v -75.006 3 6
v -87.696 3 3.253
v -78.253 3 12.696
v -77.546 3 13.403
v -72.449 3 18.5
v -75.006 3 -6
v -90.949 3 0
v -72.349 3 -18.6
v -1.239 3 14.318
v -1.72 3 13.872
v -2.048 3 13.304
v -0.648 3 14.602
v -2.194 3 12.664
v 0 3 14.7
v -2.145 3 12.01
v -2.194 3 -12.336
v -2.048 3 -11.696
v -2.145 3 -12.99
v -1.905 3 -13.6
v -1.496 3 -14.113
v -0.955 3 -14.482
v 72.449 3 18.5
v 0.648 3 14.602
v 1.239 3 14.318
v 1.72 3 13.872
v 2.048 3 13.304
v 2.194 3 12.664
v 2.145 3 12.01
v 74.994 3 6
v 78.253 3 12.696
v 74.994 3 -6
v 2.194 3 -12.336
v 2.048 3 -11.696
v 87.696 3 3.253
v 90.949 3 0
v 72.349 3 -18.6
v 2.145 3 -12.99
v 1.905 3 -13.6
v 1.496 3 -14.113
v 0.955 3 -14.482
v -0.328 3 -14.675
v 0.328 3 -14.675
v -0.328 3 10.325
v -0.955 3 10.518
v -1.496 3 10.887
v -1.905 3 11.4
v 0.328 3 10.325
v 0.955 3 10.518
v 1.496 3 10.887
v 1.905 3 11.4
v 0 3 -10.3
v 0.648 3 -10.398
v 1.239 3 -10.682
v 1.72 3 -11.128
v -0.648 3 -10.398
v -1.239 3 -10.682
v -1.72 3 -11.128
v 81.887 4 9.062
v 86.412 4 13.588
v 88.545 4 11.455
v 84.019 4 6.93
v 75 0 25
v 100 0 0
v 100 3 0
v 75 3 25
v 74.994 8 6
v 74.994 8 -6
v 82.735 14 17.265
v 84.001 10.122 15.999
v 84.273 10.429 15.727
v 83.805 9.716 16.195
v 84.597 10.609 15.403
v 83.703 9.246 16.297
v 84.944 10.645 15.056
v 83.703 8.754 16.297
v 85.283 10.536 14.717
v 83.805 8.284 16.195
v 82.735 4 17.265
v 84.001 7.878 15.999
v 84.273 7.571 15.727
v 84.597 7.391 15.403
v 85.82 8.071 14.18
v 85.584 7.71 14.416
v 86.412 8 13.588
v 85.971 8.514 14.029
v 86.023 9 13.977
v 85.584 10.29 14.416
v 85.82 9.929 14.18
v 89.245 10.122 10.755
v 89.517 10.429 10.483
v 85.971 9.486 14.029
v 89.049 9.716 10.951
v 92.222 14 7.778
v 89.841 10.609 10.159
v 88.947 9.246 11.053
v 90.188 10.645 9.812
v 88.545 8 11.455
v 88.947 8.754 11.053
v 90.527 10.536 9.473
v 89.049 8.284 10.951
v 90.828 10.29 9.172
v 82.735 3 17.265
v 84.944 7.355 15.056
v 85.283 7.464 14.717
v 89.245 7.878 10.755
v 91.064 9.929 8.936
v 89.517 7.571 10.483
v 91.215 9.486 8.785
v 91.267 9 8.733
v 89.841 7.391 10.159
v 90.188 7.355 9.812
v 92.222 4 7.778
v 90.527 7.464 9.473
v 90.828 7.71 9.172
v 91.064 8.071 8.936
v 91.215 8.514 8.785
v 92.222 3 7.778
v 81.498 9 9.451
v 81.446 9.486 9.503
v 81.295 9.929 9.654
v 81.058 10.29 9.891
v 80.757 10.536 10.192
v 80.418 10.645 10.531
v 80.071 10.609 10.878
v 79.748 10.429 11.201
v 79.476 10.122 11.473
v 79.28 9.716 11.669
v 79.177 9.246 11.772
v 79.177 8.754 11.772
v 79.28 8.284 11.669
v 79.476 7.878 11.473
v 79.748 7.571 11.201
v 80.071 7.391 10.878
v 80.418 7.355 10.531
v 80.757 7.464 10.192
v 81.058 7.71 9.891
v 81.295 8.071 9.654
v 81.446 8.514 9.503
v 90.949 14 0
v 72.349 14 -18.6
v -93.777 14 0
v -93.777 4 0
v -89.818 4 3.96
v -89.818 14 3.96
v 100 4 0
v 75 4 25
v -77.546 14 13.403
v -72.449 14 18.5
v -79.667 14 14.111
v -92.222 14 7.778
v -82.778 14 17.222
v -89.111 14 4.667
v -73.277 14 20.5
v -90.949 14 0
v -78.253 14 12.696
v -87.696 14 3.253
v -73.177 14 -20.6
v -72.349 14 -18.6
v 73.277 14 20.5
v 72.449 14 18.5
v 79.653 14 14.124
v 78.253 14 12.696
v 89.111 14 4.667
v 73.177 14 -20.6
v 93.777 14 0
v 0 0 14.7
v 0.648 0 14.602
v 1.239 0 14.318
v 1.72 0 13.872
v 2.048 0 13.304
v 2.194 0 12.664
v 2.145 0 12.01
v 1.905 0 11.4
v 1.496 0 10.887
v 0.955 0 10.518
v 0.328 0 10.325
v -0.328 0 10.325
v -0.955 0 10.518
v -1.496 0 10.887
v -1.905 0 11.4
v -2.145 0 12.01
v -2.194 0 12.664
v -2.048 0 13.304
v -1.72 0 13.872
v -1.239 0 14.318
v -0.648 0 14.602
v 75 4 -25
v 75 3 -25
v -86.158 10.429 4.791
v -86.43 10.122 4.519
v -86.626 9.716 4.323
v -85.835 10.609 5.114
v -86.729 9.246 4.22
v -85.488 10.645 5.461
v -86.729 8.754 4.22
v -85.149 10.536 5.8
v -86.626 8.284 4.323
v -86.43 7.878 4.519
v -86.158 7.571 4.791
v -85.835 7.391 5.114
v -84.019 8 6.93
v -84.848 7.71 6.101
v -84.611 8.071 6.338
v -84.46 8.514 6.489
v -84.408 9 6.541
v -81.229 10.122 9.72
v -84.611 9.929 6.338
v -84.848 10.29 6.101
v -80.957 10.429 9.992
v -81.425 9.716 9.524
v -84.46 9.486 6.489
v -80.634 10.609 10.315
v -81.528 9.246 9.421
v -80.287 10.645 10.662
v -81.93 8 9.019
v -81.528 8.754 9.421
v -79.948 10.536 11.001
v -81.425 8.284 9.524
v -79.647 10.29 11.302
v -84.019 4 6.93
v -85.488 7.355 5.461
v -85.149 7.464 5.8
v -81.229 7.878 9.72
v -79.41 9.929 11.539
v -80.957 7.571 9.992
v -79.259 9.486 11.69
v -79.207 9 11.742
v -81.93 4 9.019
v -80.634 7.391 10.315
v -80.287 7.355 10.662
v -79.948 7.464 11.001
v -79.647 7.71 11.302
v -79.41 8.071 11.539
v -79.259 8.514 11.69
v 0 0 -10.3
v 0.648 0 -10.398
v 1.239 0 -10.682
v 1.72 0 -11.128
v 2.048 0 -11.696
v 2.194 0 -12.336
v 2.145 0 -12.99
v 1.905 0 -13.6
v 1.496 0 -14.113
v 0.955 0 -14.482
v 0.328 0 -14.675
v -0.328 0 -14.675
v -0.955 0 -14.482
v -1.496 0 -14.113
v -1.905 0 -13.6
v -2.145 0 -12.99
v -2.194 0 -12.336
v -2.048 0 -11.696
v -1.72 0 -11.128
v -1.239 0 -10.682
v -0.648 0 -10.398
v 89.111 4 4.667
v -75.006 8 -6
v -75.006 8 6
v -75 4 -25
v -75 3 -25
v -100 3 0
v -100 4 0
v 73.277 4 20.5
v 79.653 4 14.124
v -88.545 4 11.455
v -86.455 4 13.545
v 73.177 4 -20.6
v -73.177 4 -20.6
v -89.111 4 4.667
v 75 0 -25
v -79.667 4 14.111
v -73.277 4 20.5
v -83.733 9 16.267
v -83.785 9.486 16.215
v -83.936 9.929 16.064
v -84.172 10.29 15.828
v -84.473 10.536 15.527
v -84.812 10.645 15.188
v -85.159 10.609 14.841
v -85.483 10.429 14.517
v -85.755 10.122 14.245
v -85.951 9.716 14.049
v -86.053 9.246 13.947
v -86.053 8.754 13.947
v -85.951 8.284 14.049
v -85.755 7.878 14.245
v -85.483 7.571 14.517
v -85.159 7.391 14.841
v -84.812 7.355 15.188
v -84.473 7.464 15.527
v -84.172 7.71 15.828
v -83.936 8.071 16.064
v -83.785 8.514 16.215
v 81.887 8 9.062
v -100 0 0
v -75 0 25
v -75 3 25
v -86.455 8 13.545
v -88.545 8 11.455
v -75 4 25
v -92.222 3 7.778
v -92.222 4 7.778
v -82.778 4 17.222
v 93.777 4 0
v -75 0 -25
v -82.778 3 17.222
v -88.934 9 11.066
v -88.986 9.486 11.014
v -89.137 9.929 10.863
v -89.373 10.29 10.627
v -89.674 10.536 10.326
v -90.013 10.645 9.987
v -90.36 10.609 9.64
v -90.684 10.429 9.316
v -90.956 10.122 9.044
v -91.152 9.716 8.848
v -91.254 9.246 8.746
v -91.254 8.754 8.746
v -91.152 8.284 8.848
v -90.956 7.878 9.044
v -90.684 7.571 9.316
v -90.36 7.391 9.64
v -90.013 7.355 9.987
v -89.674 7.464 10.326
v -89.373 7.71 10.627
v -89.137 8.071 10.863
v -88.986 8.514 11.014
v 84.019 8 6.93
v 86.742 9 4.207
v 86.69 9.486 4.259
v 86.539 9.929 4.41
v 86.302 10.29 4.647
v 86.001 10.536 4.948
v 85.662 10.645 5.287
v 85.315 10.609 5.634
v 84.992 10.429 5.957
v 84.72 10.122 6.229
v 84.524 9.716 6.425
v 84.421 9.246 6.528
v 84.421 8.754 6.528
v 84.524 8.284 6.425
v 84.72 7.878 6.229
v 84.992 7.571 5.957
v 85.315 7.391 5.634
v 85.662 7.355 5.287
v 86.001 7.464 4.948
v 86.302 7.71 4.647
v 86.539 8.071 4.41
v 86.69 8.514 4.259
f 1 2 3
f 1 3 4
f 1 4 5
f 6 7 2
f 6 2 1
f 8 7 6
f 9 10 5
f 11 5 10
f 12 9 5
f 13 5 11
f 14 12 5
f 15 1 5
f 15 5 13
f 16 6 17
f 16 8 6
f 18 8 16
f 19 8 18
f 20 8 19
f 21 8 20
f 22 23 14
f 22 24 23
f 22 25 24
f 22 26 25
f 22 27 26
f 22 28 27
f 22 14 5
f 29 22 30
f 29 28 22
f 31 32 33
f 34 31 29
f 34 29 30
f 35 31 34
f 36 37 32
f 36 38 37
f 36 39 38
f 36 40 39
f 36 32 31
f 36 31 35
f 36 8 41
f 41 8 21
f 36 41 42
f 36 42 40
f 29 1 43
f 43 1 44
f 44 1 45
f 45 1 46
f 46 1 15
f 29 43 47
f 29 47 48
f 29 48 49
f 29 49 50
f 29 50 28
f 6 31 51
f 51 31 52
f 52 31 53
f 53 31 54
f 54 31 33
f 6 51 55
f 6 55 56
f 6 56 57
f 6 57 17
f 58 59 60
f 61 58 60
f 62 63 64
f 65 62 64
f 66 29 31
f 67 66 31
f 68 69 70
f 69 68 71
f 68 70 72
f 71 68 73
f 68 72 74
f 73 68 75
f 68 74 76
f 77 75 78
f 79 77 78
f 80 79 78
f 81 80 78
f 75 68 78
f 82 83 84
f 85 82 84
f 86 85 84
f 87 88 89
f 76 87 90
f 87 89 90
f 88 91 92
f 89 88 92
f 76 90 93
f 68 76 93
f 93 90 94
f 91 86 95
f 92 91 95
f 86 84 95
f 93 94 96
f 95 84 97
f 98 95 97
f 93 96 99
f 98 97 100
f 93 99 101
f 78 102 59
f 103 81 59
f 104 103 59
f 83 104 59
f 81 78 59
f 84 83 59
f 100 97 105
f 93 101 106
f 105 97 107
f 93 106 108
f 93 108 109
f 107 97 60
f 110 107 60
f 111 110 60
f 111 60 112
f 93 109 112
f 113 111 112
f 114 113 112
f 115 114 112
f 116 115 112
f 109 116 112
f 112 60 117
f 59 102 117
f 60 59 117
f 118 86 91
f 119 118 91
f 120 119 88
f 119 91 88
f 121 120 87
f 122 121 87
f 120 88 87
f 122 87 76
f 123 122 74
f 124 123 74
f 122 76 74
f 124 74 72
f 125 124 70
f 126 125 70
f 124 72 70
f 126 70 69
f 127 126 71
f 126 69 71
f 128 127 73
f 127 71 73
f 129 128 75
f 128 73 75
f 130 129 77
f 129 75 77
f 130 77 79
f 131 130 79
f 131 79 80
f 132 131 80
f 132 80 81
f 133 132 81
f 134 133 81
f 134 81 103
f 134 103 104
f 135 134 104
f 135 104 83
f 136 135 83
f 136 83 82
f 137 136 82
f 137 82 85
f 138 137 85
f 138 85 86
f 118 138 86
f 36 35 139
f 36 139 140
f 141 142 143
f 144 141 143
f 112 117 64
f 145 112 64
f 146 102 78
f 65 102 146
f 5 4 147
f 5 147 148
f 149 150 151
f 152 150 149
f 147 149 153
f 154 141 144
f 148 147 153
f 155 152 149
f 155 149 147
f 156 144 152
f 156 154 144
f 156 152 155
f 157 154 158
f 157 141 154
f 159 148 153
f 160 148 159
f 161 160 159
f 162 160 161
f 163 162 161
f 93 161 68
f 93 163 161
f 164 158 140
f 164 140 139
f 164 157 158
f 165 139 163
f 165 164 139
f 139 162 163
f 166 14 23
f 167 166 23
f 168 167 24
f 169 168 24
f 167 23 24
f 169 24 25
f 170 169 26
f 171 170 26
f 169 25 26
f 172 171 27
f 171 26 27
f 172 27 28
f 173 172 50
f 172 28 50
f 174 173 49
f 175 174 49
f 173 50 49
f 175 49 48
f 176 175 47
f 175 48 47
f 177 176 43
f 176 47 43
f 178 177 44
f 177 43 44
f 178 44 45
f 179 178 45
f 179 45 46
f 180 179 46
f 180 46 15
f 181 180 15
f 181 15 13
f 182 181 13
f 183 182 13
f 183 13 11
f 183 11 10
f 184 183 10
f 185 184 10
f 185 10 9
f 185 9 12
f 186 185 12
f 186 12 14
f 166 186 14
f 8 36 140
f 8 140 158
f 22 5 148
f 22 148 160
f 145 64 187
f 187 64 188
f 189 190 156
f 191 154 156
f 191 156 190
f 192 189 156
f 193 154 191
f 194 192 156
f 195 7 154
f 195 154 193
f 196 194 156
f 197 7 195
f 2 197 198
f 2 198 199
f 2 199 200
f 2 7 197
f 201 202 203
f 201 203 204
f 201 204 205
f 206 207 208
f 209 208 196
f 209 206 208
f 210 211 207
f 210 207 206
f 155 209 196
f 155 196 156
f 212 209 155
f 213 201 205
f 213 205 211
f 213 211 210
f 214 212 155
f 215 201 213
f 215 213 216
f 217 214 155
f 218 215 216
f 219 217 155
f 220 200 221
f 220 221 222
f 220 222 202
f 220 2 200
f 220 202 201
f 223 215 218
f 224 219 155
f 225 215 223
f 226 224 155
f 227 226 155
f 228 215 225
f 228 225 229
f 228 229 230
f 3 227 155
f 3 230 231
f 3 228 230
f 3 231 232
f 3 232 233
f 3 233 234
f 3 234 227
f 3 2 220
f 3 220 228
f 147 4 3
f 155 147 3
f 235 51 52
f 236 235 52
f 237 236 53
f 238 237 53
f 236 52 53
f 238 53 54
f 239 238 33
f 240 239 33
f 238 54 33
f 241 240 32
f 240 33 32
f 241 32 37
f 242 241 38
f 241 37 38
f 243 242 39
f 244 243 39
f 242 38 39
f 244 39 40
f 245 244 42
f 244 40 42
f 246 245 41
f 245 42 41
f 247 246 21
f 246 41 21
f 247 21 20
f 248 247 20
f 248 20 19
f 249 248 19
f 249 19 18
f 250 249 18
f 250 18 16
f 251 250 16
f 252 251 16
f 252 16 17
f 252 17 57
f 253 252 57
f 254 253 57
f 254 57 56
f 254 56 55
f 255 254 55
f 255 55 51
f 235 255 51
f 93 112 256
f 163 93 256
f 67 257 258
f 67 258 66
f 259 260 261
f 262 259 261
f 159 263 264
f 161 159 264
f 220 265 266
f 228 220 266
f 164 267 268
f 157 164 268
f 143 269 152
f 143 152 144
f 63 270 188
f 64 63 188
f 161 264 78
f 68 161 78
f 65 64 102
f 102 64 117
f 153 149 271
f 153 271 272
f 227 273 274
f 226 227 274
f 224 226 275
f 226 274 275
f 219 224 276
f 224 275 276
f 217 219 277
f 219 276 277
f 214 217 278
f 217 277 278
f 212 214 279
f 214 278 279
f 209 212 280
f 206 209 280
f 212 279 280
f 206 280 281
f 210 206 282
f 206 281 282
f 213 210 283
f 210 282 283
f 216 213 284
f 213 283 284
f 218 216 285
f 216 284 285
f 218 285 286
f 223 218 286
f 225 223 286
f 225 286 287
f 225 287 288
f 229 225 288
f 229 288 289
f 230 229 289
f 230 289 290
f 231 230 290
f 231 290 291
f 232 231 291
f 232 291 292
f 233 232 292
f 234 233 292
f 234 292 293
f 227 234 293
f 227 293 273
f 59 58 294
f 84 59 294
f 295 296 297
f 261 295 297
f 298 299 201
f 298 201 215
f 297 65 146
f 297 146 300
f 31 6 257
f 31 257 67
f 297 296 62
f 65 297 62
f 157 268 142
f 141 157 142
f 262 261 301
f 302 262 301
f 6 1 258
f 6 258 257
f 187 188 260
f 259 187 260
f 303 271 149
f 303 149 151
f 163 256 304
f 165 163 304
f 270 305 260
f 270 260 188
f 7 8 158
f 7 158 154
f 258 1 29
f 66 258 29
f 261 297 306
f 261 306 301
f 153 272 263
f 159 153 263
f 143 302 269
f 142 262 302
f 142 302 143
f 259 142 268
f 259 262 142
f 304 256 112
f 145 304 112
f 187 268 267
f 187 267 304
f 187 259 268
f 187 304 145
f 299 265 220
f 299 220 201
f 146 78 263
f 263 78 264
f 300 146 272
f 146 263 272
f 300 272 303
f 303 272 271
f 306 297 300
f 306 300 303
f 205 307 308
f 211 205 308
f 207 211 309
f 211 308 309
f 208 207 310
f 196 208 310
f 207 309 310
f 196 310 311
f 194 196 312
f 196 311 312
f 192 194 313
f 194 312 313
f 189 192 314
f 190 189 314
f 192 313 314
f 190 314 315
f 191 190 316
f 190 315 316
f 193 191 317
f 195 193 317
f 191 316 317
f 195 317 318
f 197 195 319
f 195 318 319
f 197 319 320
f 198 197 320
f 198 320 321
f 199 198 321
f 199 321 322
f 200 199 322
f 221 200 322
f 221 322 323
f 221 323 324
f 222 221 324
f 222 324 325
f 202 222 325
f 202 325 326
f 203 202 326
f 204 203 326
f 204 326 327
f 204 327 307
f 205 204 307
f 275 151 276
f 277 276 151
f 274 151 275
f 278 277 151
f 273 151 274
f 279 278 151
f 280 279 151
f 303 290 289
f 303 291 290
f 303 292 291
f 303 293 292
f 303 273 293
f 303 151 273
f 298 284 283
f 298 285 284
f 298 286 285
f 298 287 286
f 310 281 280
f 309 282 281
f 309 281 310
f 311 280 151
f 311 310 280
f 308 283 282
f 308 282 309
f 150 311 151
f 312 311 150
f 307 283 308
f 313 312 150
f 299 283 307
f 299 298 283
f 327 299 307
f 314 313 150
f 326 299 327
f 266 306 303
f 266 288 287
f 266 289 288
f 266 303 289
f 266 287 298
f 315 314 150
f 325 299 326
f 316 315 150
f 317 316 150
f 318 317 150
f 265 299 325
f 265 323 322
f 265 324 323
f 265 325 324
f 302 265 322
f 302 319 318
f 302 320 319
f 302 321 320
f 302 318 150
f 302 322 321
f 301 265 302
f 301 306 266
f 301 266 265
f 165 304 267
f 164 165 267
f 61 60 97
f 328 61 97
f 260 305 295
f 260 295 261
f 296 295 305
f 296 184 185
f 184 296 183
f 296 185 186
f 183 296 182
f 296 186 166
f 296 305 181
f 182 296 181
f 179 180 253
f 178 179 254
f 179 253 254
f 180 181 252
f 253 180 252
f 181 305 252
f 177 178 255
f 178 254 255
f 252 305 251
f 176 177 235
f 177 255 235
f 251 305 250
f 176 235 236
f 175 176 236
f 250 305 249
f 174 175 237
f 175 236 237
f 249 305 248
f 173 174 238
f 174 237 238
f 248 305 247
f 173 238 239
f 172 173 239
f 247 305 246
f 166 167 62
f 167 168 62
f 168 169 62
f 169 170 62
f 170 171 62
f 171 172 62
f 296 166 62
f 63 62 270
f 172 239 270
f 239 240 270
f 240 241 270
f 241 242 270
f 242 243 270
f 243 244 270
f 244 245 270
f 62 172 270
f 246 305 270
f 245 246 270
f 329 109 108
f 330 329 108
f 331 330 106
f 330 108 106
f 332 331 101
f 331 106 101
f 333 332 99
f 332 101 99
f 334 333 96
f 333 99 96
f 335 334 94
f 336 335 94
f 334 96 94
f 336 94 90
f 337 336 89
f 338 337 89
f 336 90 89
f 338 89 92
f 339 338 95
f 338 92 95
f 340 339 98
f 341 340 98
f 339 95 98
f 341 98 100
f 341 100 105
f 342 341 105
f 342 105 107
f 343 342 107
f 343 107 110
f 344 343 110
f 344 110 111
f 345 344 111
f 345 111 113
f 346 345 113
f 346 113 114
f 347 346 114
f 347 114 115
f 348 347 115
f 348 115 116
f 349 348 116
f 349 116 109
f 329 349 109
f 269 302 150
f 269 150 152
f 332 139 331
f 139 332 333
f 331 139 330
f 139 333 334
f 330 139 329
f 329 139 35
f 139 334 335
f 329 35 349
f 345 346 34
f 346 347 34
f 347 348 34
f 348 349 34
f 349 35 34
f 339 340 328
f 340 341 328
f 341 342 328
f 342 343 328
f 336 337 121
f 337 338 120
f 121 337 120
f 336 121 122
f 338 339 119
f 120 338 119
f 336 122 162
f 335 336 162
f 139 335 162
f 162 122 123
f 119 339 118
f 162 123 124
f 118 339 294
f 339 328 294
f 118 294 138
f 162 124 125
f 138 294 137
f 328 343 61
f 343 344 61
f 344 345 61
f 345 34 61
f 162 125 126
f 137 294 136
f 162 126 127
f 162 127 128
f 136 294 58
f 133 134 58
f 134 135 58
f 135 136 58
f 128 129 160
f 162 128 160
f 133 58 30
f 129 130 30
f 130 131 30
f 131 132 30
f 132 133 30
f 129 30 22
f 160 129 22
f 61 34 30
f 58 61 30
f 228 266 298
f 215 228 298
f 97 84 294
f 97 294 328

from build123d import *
from build123d.topology import SkipClean

# Parameters (mm, degrees)
SKIZZE1_W                       = 200
SKIZZE1_H                       = 50
AUFSATZ_LINEAR_AUSTRAGEN1_DEPTH = 3
FASE1_SIZE                      = 25
AUFSATZ_LINEAR_AUSTRAGEN2_DEPTH = 11
SKIZZE3_W                       = 15.35533906
SKIZZE3_H                       = 11
SCHNITT_LINEAR_AUSTRAGEN1_DEPTH = 10
SKIZZE4_W                       = 15.35533906
SKIZZE4_H                       = 11
SCHNITT_LINEAR_AUSTRAGEN2_DEPTH = 10
SKIZZE5_W                       = 150
SKIZZE5_H                       = 12
AUFSATZ_LINEAR_AUSTRAGEN3_DEPTH = 5
AUFSATZ_LINEAR_AUSTRAGEN4_DEPTH = 11
AUFSATZ_LINEAR_AUSTRAGEN5_DEPTH = 11
SKIZZE12_R                      = 2.2
SCHNITT_LINEAR_AUSTRAGEN8_DEPTH = 10
AUFSATZ_LINEAR_AUSTRAGEN6_DEPTH = 11
SKIZZE8_R                       = 1.65
SKIZZE8_W                       = 3.016289267
SKIZZE8_H                       = 4
SCHNITT_LINEAR_AUSTRAGEN9_DEPTH = 10
AUFSATZ_LINEAR_AUSTRAGEN7_DEPTH = 1
SKIZZE11_R                      = 1.65
SKIZZE11_W                      = 2.95533906
SKIZZE11_H                      = 4
SCHNITT_LINEAR_AUSTRAGEN7_DEPTH = 10


with BuildPart() as part:
    # Skizze1 → Aufsatz-Linear austragen1 (new body)
    with BuildSketch(Plane(origin=(0, 0, 0), x_dir=(1, 0, 0), z_dir=(0, 1, 0))):
        Rectangle(SKIZZE1_W, SKIZZE1_H)
    extrude(amount=AUFSATZ_LINEAR_AUSTRAGEN1_DEPTH)

    # Fase1
    fase1_edges = [part.edges().sort_by_distance(p)[0] for p in [
        (-100, 1.5, -25),
        (-100, 1.5, 25),
        (100, 1.5, -25),
        (100, 1.5, 25),
    ]]
    chamfer(fase1_edges, length=FASE1_SIZE - 0.0001)  # a hair under: the kernel refuses the full size

    # Skizze2 → Aufsatz-Linear austragen2 (add)
    with BuildSketch(Plane(origin=(0, 3, 0), x_dir=(1, 0, 0), z_dir=(0, 1, 0))):
        Polygon((-73.177460326, 20.6), (-93.777460326, 0), (-73.277460326, -20.5), (73.277460326, -20.5), (93.777460326, 0), (73.177460326, 20.6), align=None)
        Polygon((90.949033201, 0), (72.349033201, 18.6), (-72.349033201, 18.6), (-90.949033201, 0), (-72.449033201, -18.5), (72.449033201, -18.5), align=None, mode=Mode.SUBTRACT)
    extrude(amount=AUFSATZ_LINEAR_AUSTRAGEN2_DEPTH)

    # Skizze3 → Schnitt-Linear austragen1 (cut)
    with BuildSketch(Plane(origin=(-46.888730163, 0, 46.888730163), x_dir=(0.7071067811865476, 0, 0.7071067811865476), z_dir=(-0.7071067811865476, 0, 0.7071067811865476))):
        with Locations((-53.033008589, 8.5)):
            Rectangle(SKIZZE3_W, SKIZZE3_H)
    extrude(amount=-SCHNITT_LINEAR_AUSTRAGEN1_DEPTH, mode=Mode.SUBTRACT)

    # Skizze4 → Schnitt-Linear austragen2 (cut)
    with BuildSketch(Plane(origin=(46.888730163, 0, 46.888730163), x_dir=(0.7071067811865475, 0, -0.7071067811865477), z_dir=(0.7071067811865477, 0, 0.7071067811865475))):
        with Locations((53.033008589, 8.5)):
            Rectangle(SKIZZE4_W, SKIZZE4_H)
    extrude(amount=-SCHNITT_LINEAR_AUSTRAGEN2_DEPTH, mode=Mode.SUBTRACT)

    # Skizze5 → Aufsatz-Linear austragen3 (add)
    with BuildSketch(Plane(origin=(0, 3, 0), x_dir=(1, 0, 0), z_dir=(0, 1, 0))):
        with Locations((-0.006490323, 0)):
            Rectangle(SKIZZE5_W, SKIZZE5_H)
    extrude(amount=AUFSATZ_LINEAR_AUSTRAGEN3_DEPTH)

    # Skizze6 → Aufsatz-Linear austragen4 (add)
    with BuildSketch(Plane(origin=(0, 3, 0), x_dir=(1, 0, 0), z_dir=(0, 1, 0))):
        Polygon((87.696342007, -3.252691193), (78.252691193, -12.696342007), (82.735076288, -17.264923712), (92.221825407, -7.778174593), align=None)
    extrude(amount=AUFSATZ_LINEAR_AUSTRAGEN4_DEPTH)

    # Skizze10 → Aufsatz-Linear austragen5 (add)
    with BuildSketch(Plane(origin=(0, 3, 0), x_dir=(1, 0, 0), z_dir=(0, 1, 0))):
        Polygon((-87.696342007, -3.252691193), (-78.252691193, -12.696342007), (-82.778174593, -17.221825407), (-92.221825407, -7.778174593), align=None)
    extrude(amount=AUFSATZ_LINEAR_AUSTRAGEN5_DEPTH)

    # Skizze12 → Schnitt-Linear austragen8 (cut)
    with BuildSketch(Plane(origin=(0, 3, 0), x_dir=(1, 0, 0), z_dir=(0, 1, 0))):
        with Locations(Location((0, 12.5, 0), (0, 0, 270))):
            Circle(SKIZZE12_R)
        with Locations(Location((0, -12.5, 0), (0, 0, 270))):
            Circle(SKIZZE12_R)
    extrude(amount=-SCHNITT_LINEAR_AUSTRAGEN8_DEPTH, mode=Mode.SUBTRACT)

    # Skizze13 → Aufsatz-Linear austragen6 (add)
    with BuildSketch(Plane(origin=(0, 3, 0), x_dir=(1, 0, 0), z_dir=(0, 1, 0))):
        Polygon((89.817662351, -3.959797975), (88.403448789, -2.545584412), (87.69285367, -3.256179531), (89.107067232, -4.670393094), align=None)
        Polygon((-89.817662351, -3.959797975), (-88.403448789, -2.545584412), (-87.689553601, -3.2594796), (-89.103767163, -4.673693162), align=None)
        Polygon((78.959797975, -14.817662351), (77.545584412, -13.403448789), (78.257117259, -12.691915942), (79.671330821, -14.106129505), align=None)
        Polygon((-78.959797975, -14.817662351), (-77.545584412, -13.403448789), (-78.262212477, -12.686820723), (-79.67642604, -14.101034286), align=None)
    extrude(amount=AUFSATZ_LINEAR_AUSTRAGEN6_DEPTH)

    # Skizze8 → Schnitt-Linear austragen9 (cut)
    with BuildSketch(Plane(origin=(50, 0, 50), x_dir=(0.7071067811865488, 0, -0.7071067811865465), z_dir=(0.7071067811865465, 0, 0.7071067811865488))):
        with Locations((49.294388852, 9)):
            Circle(SKIZZE8_R)
        with Locations((56.710678119, 9)):
            Circle(SKIZZE8_R)
        with Locations((53.002533486, 6)):
            Rectangle(SKIZZE8_W, SKIZZE8_H)
    extrude(amount=-SCHNITT_LINEAR_AUSTRAGEN9_DEPTH, mode=Mode.SUBTRACT)

    # Skizze14 → Aufsatz-Linear austragen7 (add)
    with SkipClean():  # the faces are left unmerged after this step: merging them gives an invalid solid
        with BuildSketch(Plane(origin=(0, 3, 0), x_dir=(1, 0, 0), z_dir=(0, 1, 0))):
            Polygon((-89.11055557, -4.666904756), (-93.777460326, 0), (-73.177460326, 20.6), (73.177460326, 20.6), (93.777460326, 0), (89.11055557, -4.666904756), (92.221825407, -7.778174593), (100, 0), (75, 25), (-75, 25), (-100, 0), (-92.221825407, -7.778174593), align=None)
            Polygon((-82.778174593, -17.221825407), (-79.666904756, -14.11055557), (-73.277460326, -20.5), (73.277460326, -20.5), (79.653436535, -14.12402379), (82.735076288, -17.264923712), (75, -25), (-75, -25), align=None)
        extrude(amount=AUFSATZ_LINEAR_AUSTRAGEN7_DEPTH)

    # Skizze11 → Schnitt-Linear austragen7 (cut)
    with SkipClean():  # the faces are left unmerged after this step: merging them gives an invalid solid
        with BuildSketch(Plane(origin=(-50, 0, 50), x_dir=(0.7071067811865465, 0, 0.7071067811865488), z_dir=(-0.7071067811865488, 0, 0.7071067811865465))):
            with Locations((-56.710678119, 9)):
                Circle(SKIZZE11_R)
            with Locations((-49.355339059, 9)):
                Circle(SKIZZE11_R)
            with Locations((-53.033008589, 6)):
                Rectangle(SKIZZE11_W, SKIZZE11_H)
        extrude(amount=-SCHNITT_LINEAR_AUSTRAGEN7_DEPTH, mode=Mode.SUBTRACT)


solid = part.part
